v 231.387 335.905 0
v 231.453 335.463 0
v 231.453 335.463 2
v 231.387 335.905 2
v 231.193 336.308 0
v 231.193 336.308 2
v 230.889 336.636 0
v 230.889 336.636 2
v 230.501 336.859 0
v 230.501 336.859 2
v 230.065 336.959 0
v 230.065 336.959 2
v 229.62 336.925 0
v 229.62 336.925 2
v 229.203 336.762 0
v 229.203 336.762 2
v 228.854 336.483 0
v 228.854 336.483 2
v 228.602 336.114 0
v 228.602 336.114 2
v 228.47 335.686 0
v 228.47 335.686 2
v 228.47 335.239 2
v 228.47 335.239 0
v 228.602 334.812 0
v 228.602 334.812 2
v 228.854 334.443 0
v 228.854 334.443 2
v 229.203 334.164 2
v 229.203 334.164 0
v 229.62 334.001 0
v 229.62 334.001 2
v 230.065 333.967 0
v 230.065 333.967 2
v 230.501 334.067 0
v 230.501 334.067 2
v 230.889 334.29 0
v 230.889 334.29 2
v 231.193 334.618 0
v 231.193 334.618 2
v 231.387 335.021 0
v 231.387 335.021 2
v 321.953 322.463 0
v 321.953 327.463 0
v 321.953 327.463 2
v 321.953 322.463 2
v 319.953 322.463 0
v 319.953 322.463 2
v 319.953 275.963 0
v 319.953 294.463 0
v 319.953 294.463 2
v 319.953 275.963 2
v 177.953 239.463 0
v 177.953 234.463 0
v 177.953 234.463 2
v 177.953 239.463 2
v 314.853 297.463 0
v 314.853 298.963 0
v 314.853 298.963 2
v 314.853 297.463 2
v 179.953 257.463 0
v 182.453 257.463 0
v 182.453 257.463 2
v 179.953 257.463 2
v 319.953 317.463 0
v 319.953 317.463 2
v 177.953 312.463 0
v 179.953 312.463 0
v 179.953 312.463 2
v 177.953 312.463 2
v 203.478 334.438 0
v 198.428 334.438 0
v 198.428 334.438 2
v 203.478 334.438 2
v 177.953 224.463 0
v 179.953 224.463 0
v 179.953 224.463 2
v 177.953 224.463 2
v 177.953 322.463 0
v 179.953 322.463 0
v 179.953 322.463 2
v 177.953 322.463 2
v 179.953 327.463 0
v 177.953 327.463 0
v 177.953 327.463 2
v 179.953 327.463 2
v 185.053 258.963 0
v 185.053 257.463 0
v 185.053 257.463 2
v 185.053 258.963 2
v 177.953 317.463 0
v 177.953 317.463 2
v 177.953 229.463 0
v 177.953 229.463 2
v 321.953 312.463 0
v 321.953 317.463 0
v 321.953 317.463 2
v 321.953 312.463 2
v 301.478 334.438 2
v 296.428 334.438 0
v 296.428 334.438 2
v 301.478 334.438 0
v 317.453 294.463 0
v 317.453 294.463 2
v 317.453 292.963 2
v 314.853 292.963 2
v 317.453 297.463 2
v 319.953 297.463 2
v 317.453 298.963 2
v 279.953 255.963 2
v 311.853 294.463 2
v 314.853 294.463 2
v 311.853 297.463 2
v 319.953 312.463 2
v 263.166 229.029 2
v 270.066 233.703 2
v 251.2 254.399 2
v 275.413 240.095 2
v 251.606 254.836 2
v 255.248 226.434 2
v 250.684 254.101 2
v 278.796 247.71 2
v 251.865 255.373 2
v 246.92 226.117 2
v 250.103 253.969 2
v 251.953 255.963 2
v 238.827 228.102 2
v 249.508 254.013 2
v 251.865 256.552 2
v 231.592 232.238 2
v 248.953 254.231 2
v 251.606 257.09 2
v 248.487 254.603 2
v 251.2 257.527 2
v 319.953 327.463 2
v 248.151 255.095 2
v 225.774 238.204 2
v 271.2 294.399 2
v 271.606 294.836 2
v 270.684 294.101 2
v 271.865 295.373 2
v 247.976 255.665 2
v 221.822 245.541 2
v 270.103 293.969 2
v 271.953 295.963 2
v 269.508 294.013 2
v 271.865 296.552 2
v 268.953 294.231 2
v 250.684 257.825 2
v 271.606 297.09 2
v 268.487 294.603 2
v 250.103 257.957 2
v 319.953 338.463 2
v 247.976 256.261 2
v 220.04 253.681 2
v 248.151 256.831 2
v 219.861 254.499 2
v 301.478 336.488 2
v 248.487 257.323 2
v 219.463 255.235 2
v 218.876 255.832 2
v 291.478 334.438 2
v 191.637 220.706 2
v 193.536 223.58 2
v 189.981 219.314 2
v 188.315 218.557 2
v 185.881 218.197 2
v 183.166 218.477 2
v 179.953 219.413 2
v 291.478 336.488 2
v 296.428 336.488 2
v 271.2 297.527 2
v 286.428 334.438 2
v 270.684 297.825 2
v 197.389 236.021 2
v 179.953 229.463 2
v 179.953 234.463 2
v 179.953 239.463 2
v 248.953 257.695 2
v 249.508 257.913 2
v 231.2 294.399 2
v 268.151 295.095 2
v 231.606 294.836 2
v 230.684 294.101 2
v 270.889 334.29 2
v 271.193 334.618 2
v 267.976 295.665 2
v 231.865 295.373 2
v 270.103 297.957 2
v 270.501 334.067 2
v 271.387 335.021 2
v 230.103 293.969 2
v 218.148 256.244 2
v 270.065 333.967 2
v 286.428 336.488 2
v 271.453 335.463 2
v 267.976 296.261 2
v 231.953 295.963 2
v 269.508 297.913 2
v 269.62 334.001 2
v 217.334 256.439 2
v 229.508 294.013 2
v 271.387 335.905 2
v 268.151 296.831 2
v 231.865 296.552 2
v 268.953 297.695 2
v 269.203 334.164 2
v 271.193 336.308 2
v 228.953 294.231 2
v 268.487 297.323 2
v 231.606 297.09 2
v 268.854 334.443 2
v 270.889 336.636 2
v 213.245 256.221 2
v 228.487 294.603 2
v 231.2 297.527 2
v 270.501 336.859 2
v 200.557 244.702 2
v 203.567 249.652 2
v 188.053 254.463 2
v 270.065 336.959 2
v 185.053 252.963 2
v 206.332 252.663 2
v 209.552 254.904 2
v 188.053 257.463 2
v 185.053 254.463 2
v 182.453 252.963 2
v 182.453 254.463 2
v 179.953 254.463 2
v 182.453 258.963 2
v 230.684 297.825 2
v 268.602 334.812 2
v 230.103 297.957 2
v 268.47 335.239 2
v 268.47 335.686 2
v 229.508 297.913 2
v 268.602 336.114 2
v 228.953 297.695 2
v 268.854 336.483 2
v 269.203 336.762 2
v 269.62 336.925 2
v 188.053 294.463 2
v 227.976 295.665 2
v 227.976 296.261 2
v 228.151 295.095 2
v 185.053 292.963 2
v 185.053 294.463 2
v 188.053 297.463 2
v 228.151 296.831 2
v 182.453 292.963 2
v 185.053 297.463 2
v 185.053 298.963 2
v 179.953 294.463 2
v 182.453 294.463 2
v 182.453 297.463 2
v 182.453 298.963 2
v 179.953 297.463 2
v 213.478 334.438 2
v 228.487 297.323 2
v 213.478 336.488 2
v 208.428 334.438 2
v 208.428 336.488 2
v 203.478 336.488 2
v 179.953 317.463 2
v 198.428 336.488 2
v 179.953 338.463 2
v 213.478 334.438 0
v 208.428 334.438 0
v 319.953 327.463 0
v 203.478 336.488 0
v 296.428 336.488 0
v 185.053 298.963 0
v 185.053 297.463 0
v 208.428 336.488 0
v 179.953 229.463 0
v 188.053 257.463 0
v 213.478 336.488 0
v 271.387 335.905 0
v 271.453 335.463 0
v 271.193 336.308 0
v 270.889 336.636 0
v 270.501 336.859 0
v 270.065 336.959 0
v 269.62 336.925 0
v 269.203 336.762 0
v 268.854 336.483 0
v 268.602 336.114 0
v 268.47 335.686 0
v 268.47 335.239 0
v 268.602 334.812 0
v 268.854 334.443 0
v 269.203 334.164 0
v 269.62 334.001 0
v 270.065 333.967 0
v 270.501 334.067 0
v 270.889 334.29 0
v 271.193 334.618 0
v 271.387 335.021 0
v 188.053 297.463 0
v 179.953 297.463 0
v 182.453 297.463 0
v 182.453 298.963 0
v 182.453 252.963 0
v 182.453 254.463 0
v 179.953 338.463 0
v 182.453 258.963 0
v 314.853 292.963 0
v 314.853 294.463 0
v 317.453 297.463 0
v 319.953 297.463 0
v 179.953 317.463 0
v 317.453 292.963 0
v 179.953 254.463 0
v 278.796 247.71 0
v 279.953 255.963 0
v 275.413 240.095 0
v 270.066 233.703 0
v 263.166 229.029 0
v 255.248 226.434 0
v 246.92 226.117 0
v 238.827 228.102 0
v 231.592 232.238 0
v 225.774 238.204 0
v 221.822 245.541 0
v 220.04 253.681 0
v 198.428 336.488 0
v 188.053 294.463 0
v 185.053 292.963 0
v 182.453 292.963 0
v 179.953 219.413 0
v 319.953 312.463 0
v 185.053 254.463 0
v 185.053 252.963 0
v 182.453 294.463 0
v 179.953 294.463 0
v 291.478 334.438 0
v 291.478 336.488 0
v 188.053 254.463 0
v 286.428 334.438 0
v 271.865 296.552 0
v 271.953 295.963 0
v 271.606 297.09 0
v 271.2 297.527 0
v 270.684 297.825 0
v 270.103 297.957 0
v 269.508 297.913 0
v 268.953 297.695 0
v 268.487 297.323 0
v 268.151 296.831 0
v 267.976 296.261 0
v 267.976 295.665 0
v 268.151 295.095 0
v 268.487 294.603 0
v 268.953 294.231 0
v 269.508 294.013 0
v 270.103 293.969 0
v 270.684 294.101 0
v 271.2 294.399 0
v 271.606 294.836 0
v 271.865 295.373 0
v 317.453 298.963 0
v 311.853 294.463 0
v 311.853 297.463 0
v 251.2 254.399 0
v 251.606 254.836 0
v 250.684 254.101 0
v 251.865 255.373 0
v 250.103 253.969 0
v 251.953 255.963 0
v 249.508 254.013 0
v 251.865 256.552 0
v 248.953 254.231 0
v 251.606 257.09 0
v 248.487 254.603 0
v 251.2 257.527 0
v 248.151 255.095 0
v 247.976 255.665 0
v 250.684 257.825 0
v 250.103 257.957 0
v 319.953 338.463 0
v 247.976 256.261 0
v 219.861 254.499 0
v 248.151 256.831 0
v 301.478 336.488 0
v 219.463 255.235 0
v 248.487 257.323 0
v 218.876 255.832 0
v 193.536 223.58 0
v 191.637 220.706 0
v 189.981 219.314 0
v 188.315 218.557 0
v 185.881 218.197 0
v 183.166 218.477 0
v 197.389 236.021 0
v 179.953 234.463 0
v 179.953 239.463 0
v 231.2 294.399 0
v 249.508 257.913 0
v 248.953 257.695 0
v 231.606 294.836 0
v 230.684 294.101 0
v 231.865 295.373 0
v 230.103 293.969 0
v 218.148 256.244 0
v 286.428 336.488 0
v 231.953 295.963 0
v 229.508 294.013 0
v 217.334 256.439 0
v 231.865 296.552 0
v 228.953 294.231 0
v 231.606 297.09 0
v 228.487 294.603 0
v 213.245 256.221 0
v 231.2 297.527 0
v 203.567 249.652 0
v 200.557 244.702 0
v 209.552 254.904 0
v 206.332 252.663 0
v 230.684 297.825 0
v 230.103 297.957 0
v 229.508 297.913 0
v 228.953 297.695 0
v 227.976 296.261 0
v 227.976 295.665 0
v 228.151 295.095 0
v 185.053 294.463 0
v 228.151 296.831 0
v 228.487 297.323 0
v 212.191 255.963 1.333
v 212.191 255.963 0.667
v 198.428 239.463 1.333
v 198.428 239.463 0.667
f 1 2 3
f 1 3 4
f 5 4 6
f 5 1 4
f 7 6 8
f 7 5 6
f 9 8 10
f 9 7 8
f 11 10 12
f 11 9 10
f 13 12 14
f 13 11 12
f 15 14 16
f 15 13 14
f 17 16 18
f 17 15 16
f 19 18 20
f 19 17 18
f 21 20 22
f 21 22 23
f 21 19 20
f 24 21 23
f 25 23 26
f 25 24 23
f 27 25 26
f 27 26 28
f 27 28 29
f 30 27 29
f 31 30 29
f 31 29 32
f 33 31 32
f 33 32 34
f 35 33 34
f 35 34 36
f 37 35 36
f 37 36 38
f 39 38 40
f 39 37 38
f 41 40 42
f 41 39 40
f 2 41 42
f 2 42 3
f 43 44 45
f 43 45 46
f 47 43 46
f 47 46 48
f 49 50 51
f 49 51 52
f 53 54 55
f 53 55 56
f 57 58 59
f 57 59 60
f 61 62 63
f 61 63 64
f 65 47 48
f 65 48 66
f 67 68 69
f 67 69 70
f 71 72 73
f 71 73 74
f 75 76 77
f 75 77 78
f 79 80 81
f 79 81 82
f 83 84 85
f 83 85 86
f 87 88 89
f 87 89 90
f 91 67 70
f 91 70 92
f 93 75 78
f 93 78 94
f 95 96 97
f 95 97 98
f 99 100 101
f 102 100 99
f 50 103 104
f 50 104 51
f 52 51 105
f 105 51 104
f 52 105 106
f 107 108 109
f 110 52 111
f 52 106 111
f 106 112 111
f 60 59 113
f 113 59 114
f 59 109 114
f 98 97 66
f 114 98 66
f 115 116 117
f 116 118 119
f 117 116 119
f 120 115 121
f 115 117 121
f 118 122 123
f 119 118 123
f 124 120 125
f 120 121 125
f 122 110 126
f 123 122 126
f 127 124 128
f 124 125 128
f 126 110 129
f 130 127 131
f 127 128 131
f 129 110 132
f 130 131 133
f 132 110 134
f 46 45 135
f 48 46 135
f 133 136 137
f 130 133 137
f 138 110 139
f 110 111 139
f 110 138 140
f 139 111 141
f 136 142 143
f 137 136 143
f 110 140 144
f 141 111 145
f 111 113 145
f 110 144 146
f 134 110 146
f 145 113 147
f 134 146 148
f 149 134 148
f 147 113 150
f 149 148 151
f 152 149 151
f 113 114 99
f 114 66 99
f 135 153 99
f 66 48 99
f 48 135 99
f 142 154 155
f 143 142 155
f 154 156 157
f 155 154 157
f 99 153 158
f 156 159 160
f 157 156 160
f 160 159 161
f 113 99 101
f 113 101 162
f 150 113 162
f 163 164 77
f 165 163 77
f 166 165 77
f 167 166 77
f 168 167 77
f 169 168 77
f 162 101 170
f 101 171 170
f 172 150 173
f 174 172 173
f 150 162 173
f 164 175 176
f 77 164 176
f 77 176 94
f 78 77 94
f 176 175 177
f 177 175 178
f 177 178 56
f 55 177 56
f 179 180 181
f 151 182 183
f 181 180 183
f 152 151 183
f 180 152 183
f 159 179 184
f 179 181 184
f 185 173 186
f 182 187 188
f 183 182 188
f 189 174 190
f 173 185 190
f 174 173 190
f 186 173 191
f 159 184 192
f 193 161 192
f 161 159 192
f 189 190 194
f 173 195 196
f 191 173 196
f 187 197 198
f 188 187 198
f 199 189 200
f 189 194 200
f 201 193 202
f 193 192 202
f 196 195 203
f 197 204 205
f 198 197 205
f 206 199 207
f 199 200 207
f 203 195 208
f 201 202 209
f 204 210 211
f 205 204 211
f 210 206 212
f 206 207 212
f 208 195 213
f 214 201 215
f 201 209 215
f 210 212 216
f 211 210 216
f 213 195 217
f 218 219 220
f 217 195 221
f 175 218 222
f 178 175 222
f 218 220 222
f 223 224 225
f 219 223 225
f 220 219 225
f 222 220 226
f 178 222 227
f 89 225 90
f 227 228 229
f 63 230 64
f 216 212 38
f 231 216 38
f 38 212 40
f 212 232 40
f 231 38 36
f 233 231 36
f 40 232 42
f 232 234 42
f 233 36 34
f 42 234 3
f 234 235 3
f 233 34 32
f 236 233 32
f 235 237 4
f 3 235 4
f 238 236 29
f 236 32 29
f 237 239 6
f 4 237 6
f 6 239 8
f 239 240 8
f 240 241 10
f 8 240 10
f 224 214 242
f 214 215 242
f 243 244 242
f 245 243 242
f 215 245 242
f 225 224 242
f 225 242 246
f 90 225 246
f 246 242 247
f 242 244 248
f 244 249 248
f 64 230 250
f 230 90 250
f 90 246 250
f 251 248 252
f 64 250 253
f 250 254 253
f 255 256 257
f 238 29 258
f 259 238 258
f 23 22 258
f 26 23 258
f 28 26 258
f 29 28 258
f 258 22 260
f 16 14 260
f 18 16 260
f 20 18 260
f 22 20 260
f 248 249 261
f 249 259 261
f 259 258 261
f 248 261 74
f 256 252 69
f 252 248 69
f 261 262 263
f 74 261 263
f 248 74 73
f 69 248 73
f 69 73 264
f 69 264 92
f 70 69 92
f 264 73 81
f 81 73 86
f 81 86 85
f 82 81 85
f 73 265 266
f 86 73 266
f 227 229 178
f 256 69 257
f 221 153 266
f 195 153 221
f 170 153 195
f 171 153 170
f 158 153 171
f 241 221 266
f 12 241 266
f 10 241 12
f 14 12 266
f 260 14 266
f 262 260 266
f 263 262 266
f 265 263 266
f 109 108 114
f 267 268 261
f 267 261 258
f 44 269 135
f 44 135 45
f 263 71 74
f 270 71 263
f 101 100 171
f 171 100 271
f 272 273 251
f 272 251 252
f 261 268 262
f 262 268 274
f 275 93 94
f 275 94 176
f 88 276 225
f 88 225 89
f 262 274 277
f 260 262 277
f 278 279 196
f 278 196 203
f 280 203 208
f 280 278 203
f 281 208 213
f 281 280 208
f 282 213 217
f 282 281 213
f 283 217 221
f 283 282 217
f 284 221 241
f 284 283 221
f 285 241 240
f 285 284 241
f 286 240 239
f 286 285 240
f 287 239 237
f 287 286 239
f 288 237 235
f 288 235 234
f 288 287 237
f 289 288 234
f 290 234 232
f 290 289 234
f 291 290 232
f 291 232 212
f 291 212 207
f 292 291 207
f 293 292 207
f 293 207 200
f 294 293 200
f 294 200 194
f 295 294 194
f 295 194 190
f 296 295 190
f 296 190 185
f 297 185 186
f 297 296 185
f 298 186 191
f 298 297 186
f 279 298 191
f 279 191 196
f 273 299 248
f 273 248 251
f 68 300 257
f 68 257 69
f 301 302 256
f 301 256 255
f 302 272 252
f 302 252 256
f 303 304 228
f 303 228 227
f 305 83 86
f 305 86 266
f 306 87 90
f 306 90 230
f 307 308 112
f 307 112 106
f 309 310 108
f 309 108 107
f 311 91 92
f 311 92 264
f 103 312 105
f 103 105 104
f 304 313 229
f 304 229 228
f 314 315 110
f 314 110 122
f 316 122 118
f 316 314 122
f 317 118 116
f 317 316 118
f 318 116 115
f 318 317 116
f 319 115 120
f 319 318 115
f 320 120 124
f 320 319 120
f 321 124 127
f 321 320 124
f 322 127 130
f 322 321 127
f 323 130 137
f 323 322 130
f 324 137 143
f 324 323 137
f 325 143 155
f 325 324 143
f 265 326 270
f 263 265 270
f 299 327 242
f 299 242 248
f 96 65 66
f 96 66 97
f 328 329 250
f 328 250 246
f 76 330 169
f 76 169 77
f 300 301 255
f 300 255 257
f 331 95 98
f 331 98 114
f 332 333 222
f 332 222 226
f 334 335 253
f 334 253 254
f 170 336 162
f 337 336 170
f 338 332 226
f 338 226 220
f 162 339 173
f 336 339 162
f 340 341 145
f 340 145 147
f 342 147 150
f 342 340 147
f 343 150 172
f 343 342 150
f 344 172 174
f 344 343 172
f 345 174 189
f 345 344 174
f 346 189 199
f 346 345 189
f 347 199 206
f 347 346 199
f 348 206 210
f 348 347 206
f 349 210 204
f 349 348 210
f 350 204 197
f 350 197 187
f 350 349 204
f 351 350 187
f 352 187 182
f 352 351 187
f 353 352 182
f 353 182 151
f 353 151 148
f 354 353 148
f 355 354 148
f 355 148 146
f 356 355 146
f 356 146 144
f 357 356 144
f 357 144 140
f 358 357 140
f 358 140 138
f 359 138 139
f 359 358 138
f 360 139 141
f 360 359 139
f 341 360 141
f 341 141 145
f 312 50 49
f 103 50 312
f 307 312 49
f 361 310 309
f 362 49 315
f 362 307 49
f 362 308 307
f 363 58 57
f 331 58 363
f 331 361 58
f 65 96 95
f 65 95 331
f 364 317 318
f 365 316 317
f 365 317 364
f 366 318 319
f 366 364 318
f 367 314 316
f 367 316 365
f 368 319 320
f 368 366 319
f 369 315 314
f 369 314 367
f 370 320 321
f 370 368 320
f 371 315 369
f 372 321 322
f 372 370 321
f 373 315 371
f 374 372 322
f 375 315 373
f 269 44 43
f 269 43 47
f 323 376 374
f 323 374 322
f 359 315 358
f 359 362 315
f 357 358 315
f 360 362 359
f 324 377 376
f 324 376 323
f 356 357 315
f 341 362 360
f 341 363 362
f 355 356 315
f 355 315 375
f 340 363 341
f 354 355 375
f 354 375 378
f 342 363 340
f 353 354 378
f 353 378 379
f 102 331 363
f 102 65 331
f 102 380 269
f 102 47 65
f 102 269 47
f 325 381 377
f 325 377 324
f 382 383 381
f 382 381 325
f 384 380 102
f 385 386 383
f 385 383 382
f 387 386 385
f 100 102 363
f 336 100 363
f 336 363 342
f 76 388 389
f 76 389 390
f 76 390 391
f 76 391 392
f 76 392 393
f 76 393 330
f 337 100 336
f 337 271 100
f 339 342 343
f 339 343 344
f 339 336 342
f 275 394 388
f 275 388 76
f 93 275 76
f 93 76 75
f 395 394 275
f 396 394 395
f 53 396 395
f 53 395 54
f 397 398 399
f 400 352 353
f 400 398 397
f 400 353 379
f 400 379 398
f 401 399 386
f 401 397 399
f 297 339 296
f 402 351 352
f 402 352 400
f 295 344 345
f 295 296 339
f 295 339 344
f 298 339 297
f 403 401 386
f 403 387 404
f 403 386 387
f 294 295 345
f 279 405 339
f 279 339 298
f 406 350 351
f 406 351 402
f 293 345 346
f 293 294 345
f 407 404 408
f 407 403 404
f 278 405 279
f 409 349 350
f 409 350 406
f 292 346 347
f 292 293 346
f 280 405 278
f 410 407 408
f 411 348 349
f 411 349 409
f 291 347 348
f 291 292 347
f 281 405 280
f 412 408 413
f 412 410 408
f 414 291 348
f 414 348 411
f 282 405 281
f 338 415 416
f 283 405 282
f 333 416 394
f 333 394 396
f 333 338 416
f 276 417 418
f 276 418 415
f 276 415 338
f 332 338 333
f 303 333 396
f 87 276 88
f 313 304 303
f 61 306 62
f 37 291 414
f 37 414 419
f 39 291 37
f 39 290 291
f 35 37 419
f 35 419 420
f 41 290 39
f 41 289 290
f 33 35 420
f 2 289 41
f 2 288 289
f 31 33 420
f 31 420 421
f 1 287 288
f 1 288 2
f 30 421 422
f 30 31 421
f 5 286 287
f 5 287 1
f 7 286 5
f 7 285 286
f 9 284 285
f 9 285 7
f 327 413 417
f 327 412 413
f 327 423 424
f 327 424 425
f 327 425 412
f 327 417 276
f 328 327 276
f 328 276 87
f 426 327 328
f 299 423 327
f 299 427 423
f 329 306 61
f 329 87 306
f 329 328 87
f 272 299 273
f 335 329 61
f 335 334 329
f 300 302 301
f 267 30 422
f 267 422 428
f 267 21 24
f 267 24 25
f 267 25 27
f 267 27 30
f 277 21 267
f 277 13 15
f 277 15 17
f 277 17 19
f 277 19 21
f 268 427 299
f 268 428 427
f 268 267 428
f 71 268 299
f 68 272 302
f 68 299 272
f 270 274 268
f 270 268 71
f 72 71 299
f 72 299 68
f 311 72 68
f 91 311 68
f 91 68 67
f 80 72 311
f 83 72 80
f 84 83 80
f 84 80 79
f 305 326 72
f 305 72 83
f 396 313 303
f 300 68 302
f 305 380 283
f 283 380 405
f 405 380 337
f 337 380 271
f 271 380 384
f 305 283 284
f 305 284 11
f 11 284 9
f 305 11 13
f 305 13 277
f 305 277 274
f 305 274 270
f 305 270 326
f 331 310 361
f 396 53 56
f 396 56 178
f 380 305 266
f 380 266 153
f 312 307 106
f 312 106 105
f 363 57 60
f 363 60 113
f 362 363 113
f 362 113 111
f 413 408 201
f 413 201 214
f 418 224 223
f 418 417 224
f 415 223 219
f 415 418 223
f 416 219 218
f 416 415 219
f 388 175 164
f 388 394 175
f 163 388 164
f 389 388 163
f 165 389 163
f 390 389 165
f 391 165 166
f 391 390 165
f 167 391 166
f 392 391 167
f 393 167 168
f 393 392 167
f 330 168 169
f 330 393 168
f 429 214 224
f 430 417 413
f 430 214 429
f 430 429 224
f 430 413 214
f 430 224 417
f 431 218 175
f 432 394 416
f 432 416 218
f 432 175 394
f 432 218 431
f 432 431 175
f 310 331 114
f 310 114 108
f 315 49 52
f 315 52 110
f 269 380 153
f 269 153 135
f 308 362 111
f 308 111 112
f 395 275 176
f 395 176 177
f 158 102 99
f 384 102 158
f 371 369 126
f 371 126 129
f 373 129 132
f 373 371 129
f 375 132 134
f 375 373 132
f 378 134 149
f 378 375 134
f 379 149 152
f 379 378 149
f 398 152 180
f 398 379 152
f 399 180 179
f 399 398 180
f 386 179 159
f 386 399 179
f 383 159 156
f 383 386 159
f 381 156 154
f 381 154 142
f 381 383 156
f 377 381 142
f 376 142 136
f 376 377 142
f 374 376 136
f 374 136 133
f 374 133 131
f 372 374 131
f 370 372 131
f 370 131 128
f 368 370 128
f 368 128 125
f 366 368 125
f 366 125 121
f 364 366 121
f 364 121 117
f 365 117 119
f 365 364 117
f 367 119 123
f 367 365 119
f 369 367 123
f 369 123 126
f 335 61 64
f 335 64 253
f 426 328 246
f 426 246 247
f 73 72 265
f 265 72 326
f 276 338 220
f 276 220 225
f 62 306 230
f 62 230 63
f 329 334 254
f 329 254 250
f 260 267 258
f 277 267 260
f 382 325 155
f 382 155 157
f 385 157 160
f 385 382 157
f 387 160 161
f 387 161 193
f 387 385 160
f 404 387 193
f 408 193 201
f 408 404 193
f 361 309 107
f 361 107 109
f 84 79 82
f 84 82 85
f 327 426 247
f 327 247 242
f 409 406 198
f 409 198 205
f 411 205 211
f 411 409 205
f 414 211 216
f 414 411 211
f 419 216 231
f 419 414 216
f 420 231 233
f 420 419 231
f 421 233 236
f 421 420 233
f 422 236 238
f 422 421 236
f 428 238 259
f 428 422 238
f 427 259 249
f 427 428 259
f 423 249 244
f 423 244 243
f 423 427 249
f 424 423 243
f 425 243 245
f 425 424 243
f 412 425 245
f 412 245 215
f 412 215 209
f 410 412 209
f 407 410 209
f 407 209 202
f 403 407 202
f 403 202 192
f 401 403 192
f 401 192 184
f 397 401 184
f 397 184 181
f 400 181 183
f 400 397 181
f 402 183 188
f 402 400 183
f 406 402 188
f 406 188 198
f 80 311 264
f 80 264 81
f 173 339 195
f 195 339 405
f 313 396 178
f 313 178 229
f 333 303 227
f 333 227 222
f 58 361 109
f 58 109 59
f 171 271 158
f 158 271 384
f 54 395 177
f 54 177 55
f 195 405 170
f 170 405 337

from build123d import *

# Parameters (mm, degrees)
SKETCH_1_R      = 2
SKETCH_1_R_2    = 1.5
SKETCH_1_W      = 5.05
SKETCH_1_H      = 2.05
EXTRUDE_1_DEPTH = 2


with BuildPart() as part:
    # 草图1 → 凸台-拉伸1 (new body)
    with BuildSketch(Plane.XY):
        with BuildLine():
            Line((317.453360513, 294.462931603), (319.953360513, 294.462931603))
            Line((319.953360513, 294.462931603), (319.953360513, 275.962931603))
            Line((319.953360513, 275.962931603), (279.953360513, 255.962931603))
            ThreePointArc((279.953360513, 255.962931603), (251.095061372, 225.984664155), (220.040259237, 253.681184024))
            ThreePointArc((220.040259237, 253.681184024), (219.19036683, 255.554039999), (217.334030317, 256.439433332))
            add(Edge.make_bspline(
                [(217.334030317, 256.439433332), (215.548727104, 256.609856683), (206.547632182, 255.661407624), (194.456958912, 237.242452466), (194.688078584, 213.970775709), (179.953360513, 219.413055772)],
                knots=[0.04025352, 0.04025352, 0.04025352, 0.04025352, 0.124939279, 0.47725999, 1, 1, 1, 1], degree=3))
            Line((179.953360513, 219.413055772), (179.953360513, 224.462931603))
            Line((179.953360513, 224.462931603), (177.953360513, 224.462931603))
            Line((177.953360513, 224.462931603), (177.953360513, 229.462931603))
            Line((177.953360513, 229.462931603), (179.953360513, 229.462931603))
            Line((179.953360513, 229.462931603), (179.953360513, 234.462931603))
            Line((179.953360513, 234.462931603), (177.953360513, 234.462931603))
            Line((177.953360513, 234.462931603), (177.953360513, 239.462931603))
            Line((177.953360513, 239.462931603), (179.953360513, 239.462931603))
            Line((179.953360513, 239.462931603), (179.953360513, 254.462931603))
            Line((179.953360513, 254.462931603), (182.453360513, 254.462931603))
            Line((182.453360513, 254.462931603), (182.453360513, 252.962931602))
            Line((182.453360513, 252.962931602), (185.053360513, 252.962931602))
            Line((185.053360513, 252.962931602), (185.053360513, 254.462931603))
            Line((185.053360513, 254.462931603), (188.053360513, 254.462931603))
            Line((188.053360513, 254.462931603), (188.053360513, 257.462931602))
            Line((188.053360513, 257.462931602), (185.053360513, 257.462931602))
            Line((185.053360513, 257.462931602), (185.053360513, 258.962931602))
            Line((185.053360513, 258.962931602), (182.453360513, 258.962931602))
            Line((182.453360513, 258.962931602), (182.453360513, 257.462931603))
            Line((182.453360513, 257.462931603), (179.953360513, 257.462931603))
            Line((179.953360513, 257.462931603), (179.953360513, 294.462931603))
            Line((179.953360513, 294.462931603), (182.453360513, 294.462931603))
            Line((182.453360513, 294.462931603), (182.453360513, 292.962931603))
            Line((182.453360513, 292.962931603), (185.053360513, 292.962931603))
            Line((185.053360513, 292.962931603), (185.053360513, 294.462931603))
            Line((185.053360513, 294.462931603), (188.053360513, 294.462931603))
            Line((188.053360513, 294.462931603), (188.053360513, 297.462931603))
            Line((188.053360513, 297.462931603), (185.053360513, 297.462931603))
            Line((185.053360513, 297.462931603), (185.053360513, 298.962931603))
            Line((185.053360513, 298.962931603), (182.453360513, 298.962931603))
            Line((182.453360513, 298.962931603), (182.453360513, 297.462931603))
            Line((182.453360513, 297.462931603), (179.953360513, 297.462931603))
            Line((179.953360513, 297.462931603), (179.953360513, 312.462931603))
            Line((179.953360513, 312.462931603), (177.953360513, 312.462931603))
            Line((177.953360513, 312.462931603), (177.953360513, 317.462931603))
            Line((177.953360513, 317.462931603), (179.953360513, 317.462931603))
            Line((179.953360513, 317.462931603), (179.953360513, 322.462931603))
            Line((179.953360513, 322.462931603), (177.953360513, 322.462931603))
            Line((177.953360513, 322.462931603), (177.953360513, 327.462931603))
            Line((177.953360513, 327.462931603), (179.953360513, 327.462931603))
            Line((179.953360513, 327.462931603), (179.953360513, 338.462931603))
            Line((179.953360513, 338.462931603), (319.953360513, 338.462931603))
            Line((319.953360513, 338.462931603), (319.953360513, 327.462931603))
            Line((319.953360513, 327.462931603), (321.953360513, 327.462931603))
            Line((321.953360513, 327.462931603), (321.953360513, 322.462931603))
            Line((321.953360513, 322.462931603), (319.953360513, 322.462931603))
            Line((319.953360513, 322.462931603), (319.953360513, 317.462931603))
            Line((319.953360513, 317.462931603), (321.953360513, 317.462931603))
            Line((321.953360513, 317.462931603), (321.953360513, 312.462931603))
            Line((321.953360513, 312.462931603), (319.953360513, 312.462931603))
            Line((319.953360513, 312.462931603), (319.953360513, 297.462931603))
            Line((319.953360513, 297.462931603), (317.453360513, 297.462931603))
            Line((317.453360513, 297.462931603), (317.453360513, 298.962931603))
            Line((317.453360513, 298.962931603), (314.853360513, 298.962931603))
            Line((314.853360513, 298.962931603), (314.853360513, 297.462931603))
            Line((314.853360513, 297.462931603), (311.853360513, 297.462931603))
            Line((311.853360513, 297.462931603), (311.853360513, 294.462931603))
            Line((311.853360513, 294.462931603), (314.853360513, 294.462931603))
            Line((314.853360513, 294.462931603), (314.853360513, 292.962931603))
            Line((314.853360513, 292.962931603), (317.453360513, 292.962931603))
            Line((317.453360513, 292.962931603), (317.453360513, 294.462931603))
        make_face()
        with Locations((249.953360513, 255.962931603)):
            Circle(SKETCH_1_R, mode=Mode.SUBTRACT)
        with Locations((229.953360513, 335.462931603)):
            Circle(SKETCH_1_R_2, mode=Mode.SUBTRACT)
        with Locations((269.953360513, 335.462931603)):
            Circle(SKETCH_1_R_2, mode=Mode.SUBTRACT)
        with Locations((229.953360513, 295.962931603)):
            Circle(SKETCH_1_R, mode=Mode.SUBTRACT)
        with Locations((269.953360513, 295.962931603)):
            Circle(SKETCH_1_R, mode=Mode.SUBTRACT)
        with Locations((288.953360513, 335.462931603)):
            Rectangle(SKETCH_1_W, SKETCH_1_H, mode=Mode.SUBTRACT)
        with Locations((298.953360513, 335.462931603)):
            Rectangle(SKETCH_1_W, SKETCH_1_H, mode=Mode.SUBTRACT)
        with Locations((200.953360513, 335.462931603)):
            Rectangle(SKETCH_1_W, SKETCH_1_H, mode=Mode.SUBTRACT)
        with Locations((210.953360513, 335.462931603)):
            Rectangle(SKETCH_1_W, SKETCH_1_H, mode=Mode.SUBTRACT)
    extrude(amount=EXTRUDE_1_DEPTH)


solid = part.part
